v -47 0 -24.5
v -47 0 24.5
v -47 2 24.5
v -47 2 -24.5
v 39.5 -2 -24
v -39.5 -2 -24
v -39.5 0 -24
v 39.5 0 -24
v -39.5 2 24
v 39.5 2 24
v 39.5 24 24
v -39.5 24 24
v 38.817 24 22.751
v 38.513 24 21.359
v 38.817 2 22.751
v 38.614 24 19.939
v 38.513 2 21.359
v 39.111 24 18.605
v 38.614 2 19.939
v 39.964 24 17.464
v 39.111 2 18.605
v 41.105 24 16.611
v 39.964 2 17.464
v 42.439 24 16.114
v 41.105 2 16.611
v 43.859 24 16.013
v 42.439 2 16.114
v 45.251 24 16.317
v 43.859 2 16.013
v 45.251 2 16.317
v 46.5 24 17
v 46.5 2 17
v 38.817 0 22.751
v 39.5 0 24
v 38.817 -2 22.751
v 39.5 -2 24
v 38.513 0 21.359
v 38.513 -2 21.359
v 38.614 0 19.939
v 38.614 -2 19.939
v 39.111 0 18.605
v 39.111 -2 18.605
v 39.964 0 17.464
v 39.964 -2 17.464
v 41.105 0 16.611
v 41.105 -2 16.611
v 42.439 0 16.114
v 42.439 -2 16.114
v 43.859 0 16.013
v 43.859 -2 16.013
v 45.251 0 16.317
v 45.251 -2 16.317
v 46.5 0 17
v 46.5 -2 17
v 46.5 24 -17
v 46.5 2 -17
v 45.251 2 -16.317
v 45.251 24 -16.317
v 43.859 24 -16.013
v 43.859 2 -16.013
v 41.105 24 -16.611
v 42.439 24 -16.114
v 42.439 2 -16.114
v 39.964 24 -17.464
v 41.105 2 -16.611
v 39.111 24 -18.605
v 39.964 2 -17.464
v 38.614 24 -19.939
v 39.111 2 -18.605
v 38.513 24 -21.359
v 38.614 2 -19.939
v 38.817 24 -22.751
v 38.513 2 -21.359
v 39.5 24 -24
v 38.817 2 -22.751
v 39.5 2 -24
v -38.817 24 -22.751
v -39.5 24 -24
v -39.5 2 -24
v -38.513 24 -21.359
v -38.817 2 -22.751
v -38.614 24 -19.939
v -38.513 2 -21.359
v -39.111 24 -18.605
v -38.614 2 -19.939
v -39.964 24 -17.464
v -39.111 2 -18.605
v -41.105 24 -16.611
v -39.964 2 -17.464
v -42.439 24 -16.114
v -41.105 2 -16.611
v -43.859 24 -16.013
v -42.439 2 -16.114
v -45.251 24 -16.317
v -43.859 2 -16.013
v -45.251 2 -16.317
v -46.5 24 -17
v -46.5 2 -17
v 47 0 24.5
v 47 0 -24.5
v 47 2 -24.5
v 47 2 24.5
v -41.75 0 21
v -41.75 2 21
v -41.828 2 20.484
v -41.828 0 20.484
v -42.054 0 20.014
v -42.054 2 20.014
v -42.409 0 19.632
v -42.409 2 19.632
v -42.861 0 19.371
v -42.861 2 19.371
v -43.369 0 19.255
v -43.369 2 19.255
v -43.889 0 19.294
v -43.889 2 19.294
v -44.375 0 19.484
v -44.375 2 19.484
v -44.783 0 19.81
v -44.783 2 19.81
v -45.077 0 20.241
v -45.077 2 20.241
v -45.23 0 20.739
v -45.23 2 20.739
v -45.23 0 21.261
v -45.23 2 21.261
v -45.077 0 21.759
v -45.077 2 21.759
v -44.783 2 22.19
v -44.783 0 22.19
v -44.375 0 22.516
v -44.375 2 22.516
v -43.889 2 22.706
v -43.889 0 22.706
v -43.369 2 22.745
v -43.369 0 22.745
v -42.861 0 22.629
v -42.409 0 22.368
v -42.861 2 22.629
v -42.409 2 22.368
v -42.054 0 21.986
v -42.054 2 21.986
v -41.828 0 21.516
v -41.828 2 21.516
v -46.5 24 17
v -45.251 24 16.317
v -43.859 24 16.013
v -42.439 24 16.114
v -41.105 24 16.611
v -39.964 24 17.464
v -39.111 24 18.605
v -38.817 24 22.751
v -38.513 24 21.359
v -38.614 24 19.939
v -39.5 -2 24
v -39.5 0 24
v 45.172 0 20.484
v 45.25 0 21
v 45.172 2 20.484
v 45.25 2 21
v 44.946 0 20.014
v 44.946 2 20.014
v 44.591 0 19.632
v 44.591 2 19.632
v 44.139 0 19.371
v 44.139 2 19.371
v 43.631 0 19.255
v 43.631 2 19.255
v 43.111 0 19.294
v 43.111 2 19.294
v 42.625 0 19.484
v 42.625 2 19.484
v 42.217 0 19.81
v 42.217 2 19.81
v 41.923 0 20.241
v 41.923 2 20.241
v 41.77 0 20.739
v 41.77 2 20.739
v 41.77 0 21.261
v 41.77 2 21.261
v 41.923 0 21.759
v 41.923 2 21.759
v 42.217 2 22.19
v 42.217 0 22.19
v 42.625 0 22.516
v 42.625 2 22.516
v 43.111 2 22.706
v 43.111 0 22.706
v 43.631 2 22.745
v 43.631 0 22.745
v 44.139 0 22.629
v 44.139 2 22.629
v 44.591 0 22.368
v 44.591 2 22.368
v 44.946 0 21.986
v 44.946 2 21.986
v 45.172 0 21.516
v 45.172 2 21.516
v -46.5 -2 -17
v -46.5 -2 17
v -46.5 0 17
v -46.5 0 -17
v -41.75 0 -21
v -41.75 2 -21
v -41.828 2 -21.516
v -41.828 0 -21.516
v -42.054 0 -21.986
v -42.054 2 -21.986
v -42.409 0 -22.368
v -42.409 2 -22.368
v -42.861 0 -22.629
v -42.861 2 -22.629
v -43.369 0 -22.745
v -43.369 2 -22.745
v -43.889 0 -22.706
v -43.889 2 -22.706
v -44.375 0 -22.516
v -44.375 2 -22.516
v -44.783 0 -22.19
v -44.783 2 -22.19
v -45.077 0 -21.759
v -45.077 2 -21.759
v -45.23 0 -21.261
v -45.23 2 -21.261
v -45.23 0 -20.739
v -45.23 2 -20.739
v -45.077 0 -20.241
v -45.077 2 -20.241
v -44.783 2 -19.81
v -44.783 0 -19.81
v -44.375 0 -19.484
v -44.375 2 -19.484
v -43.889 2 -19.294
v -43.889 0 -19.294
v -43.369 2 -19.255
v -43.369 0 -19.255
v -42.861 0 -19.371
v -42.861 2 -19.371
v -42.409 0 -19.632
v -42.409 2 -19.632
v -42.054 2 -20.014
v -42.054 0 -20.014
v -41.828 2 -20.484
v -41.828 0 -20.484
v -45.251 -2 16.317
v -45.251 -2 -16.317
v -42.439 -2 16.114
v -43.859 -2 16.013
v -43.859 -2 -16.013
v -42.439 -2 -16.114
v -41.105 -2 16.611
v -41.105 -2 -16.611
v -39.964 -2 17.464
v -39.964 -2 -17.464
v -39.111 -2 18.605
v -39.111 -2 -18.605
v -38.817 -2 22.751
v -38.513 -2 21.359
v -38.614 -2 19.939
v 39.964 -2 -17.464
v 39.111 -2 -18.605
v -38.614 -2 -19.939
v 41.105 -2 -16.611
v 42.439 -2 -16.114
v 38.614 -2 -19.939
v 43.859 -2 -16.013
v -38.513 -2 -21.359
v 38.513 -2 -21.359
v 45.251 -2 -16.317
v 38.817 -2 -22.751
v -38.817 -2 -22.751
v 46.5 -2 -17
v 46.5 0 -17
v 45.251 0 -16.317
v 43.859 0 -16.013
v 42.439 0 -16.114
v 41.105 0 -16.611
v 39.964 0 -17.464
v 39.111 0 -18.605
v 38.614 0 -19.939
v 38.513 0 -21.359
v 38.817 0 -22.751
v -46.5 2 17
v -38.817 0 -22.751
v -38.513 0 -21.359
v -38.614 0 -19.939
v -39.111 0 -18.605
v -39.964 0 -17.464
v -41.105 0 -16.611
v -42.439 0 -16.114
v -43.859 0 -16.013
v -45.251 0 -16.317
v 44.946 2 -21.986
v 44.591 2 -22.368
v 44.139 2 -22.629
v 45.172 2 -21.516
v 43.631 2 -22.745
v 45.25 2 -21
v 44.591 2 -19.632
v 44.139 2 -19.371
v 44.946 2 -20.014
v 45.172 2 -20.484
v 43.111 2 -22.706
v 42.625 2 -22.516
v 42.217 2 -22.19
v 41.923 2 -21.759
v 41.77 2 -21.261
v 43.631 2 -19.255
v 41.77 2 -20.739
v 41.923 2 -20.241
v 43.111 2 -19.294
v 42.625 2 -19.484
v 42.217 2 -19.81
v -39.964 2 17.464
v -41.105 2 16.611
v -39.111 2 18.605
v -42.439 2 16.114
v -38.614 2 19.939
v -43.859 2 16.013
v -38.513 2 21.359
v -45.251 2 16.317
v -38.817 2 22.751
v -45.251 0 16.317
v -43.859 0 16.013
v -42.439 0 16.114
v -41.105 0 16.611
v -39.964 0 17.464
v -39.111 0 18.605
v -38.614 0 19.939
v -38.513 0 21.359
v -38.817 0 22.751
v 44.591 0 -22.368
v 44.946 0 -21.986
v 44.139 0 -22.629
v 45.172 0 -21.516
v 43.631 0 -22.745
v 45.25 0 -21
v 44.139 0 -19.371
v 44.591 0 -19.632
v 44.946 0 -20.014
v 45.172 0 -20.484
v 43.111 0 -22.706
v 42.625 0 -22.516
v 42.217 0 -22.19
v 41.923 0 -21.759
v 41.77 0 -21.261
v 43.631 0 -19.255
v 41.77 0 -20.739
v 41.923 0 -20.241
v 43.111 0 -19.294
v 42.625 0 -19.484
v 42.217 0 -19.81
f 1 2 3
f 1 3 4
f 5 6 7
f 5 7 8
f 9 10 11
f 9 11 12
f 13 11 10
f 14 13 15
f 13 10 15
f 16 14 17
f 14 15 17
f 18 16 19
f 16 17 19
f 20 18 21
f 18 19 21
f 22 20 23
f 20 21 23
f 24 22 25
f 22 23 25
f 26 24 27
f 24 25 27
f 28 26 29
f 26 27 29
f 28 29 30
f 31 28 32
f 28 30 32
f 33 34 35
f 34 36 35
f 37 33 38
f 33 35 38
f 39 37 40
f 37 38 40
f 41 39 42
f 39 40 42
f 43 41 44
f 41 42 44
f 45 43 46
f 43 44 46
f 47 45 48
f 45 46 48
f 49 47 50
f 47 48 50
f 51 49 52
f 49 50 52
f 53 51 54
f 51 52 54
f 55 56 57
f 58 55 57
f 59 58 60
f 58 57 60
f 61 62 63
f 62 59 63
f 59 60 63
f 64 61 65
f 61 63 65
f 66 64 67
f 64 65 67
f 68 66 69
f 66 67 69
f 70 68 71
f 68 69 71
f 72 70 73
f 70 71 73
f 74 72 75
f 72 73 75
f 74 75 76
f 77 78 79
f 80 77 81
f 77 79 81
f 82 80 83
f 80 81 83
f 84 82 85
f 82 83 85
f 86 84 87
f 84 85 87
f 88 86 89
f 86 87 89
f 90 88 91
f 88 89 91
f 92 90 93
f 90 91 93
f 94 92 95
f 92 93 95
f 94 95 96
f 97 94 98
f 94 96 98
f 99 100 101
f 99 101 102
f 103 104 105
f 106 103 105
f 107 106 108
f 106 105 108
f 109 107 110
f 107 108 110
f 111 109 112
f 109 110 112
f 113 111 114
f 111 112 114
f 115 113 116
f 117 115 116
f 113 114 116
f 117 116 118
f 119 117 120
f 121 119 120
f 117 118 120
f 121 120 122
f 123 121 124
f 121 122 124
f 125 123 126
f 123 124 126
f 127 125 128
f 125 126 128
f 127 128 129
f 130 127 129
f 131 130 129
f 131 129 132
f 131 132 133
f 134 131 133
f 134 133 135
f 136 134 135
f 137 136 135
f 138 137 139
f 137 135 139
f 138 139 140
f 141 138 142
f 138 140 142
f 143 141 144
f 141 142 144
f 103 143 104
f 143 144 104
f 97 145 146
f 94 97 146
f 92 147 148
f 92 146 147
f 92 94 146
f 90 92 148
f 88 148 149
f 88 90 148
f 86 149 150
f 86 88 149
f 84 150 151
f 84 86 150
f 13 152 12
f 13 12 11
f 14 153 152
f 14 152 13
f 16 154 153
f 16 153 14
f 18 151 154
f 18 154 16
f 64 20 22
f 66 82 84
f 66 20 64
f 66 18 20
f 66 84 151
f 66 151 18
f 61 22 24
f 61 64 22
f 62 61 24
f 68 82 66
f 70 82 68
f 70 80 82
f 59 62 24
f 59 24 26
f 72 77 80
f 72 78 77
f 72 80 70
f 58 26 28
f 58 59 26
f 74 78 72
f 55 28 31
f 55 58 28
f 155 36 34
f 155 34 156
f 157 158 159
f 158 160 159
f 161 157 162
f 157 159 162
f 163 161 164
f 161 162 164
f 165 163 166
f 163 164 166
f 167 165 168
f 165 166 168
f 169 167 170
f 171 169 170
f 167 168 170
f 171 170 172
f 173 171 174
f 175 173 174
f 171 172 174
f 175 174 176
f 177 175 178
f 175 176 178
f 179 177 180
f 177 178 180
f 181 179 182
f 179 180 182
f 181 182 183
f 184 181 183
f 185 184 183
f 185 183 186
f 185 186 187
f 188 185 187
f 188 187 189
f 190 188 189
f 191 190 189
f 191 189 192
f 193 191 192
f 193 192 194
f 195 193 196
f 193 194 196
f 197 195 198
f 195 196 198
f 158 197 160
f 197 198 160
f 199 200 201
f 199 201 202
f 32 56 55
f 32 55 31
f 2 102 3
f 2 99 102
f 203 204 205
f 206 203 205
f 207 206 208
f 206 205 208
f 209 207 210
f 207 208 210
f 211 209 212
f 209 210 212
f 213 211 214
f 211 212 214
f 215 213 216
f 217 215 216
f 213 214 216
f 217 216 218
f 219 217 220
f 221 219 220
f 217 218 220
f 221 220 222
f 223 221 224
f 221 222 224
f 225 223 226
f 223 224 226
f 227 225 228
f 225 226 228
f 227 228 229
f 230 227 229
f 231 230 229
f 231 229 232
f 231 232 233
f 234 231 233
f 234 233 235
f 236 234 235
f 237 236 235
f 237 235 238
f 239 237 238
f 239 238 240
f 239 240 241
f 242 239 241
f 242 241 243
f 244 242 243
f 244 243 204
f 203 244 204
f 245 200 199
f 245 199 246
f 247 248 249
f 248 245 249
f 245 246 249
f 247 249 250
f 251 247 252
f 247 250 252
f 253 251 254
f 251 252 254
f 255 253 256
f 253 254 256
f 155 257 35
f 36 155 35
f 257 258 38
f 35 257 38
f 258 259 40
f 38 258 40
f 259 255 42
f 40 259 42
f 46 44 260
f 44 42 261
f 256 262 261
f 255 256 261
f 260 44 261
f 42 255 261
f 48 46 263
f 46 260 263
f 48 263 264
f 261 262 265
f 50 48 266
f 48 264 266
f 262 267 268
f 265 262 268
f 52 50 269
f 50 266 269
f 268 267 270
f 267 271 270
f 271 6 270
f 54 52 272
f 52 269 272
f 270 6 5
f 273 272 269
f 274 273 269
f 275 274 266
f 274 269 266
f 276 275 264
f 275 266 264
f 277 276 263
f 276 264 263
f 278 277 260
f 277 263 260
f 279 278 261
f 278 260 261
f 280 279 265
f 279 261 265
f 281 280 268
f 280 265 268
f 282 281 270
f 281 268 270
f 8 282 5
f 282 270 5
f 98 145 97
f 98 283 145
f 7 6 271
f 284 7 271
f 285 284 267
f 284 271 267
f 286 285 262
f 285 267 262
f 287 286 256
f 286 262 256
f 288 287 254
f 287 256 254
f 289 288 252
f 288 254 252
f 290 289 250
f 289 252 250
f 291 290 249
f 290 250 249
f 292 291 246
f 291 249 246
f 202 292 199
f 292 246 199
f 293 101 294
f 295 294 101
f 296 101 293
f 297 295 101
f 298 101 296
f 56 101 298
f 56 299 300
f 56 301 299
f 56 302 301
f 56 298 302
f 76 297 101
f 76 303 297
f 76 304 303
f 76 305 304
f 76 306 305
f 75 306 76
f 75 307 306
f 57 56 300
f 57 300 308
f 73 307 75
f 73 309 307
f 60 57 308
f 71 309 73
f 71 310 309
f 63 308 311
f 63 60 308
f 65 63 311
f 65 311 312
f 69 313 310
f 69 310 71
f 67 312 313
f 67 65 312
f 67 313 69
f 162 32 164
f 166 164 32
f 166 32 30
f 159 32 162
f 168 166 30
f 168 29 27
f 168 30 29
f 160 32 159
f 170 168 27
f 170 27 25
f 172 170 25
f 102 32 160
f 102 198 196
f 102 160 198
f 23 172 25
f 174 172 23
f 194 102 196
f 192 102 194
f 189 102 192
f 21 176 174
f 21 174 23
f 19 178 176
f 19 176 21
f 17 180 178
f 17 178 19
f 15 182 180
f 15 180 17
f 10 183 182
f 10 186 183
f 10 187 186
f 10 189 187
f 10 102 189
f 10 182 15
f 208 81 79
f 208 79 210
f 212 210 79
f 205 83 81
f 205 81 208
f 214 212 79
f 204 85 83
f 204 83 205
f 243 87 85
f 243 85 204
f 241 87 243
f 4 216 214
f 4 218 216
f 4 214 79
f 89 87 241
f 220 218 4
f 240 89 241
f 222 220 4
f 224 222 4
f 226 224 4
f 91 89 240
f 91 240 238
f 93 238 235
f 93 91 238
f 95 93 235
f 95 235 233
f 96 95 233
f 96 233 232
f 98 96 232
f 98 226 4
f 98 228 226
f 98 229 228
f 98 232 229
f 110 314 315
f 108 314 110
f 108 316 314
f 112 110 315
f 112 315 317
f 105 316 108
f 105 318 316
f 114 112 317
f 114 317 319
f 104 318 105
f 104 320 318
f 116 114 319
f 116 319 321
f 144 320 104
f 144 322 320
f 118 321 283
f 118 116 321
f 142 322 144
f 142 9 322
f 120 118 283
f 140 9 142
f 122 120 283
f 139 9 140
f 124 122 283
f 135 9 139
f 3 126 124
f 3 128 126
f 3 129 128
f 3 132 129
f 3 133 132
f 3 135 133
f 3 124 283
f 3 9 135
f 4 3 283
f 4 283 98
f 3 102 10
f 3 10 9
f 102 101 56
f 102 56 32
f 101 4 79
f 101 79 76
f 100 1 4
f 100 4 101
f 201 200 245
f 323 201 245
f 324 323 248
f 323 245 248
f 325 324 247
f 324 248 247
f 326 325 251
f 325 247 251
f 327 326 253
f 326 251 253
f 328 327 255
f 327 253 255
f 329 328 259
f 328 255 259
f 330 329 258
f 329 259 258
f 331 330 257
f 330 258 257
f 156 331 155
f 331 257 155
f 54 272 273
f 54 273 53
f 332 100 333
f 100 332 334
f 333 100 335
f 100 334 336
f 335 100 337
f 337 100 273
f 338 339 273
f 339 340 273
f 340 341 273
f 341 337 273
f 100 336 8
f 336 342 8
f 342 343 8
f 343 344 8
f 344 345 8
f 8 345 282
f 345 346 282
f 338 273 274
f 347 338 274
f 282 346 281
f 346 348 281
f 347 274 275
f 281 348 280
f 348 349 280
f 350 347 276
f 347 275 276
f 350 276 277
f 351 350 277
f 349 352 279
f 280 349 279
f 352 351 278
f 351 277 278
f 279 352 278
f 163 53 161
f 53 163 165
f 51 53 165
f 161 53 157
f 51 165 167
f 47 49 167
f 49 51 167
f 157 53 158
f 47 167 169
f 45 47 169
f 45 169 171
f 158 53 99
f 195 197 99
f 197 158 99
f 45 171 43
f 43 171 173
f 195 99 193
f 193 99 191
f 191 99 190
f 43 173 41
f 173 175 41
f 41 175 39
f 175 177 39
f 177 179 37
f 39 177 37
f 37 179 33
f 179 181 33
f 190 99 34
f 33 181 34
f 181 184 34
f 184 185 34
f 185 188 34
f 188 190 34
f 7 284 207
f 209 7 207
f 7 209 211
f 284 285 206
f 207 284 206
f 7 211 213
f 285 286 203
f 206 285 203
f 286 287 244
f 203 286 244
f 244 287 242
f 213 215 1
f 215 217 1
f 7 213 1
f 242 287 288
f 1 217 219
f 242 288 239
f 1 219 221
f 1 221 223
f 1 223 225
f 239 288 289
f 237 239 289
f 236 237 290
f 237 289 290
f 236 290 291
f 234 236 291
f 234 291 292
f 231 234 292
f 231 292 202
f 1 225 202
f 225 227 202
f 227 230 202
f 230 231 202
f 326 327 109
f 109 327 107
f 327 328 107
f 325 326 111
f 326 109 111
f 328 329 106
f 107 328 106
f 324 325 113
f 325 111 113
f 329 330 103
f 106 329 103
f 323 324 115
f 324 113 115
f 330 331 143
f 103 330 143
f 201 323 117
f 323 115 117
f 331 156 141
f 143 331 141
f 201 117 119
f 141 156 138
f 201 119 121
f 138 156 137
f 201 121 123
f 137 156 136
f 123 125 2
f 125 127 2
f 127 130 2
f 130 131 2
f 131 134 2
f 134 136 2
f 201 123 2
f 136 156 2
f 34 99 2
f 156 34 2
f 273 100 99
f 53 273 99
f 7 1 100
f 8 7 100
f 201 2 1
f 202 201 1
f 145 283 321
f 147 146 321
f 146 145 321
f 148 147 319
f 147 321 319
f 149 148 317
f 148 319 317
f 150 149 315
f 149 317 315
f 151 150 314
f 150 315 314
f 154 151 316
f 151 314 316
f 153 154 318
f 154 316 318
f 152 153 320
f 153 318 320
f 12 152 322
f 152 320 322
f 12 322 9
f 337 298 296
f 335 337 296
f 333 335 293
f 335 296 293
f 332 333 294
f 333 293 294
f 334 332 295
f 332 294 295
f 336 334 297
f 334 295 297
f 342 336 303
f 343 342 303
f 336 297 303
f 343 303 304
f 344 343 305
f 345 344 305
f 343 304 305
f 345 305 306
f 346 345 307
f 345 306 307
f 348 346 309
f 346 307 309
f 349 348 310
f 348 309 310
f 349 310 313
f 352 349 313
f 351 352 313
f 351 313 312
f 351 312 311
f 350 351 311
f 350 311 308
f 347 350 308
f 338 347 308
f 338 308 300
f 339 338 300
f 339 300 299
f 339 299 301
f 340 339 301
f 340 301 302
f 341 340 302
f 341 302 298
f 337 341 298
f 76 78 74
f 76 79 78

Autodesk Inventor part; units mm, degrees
ref_plane "YZ Plane" through (0, 0, 0) normal (1, 0, 0) x (0, 1, 0)
ref_plane "XZ Plane" through (0, 0, 0) normal (0, 1, 0) x (-1, 0, 0)
ref_plane "XY Plane" through (0, 0, 0) normal (0, 0, 1) x (1, 0, 0)
sketch "Skizze1" plane through (0, 0, 0) normal (0, 1, 0) x (-1, 0, 0)
  line L0 (47, -24.5) -> (-47, -24.5)
  line L1 (-47, -24.5) -> (-47, 24.5)
  line L2 (-47, 24.5) -> (47, 24.5)
  line L3 (47, 24.5) -> (47, -24.5)
  point P0 (0, 0)
  point P1 (0, -24.5)
  point P2 (47, 0)
  dimension "d0" = 49
  dimension "d1" = 94
extrude "Extrusion1" add sketch "Skizze1" along normal blind 2
sketch "Skizze2" plane through (0, 2, 0) normal (0, 1, 0) x (1, 0, 0)
  circle A0 centre (-43.5, 21) radius 1.75
  circle A1 centre (-43.5, -21) radius 1.75
  circle A2 centre (43.5, -21) radius 1.75
  circle A3 centre (43.5, 21) radius 1.75
  point P0 (0, 0)
  dimension "d4" = 3.5
  dimension "d5" = 3.5
  dimension "d6" = 3.5
  dimension "d7" = 3.5
  dimension "d8" = 87
  dimension "d9" = 43.5
  dimension "d10" = 42
  dimension "d11" = 21
extrude "Extrusion2" cut sketch "Skizze2" against normal through all
sketch "Skizze4" plane through (0, 2, 0) normal (0, 1, 0) x (1, 0, 0)
  line L0 (-39.5, 24) -> (39.5, 24)
  line L1 (46.5, 17) -> (46.5, -17)
  line L2 (39.5, -24) -> (-39.5, -24)
  line L3 (-46.5, -17) -> (-46.5, 17)
  line L4 (47, -24.5) -> (47, 24.5) projected
  line L5 (47, 24.5) -> (-47, 24.5) projected
  line L6 (-47, -24.5) -> (47, -24.5) projected
  line L7 (-47, 24.5) -> (-47, -24.5) projected
  circle A0 centre (-43.5, 21) radius 1.75 projected
  arc A1 (-46.5, 17) -> (-39.5, 24) centre (-43.5, 21) ccw
  circle A2 centre (-43.5, -21) radius 1.75 projected
  arc A3 (-39.5, -24) -> (-46.5, -17) centre (-43.5, -21) ccw
  circle A4 centre (43.5, -21) radius 1.75 projected
  arc A5 (46.5, -17) -> (39.5, -24) centre (43.5, -21) ccw
  arc A6 (39.5, 24) -> (46.5, 17) centre (43.5, 21) ccw
  circle A7 centre (43.5, 21) radius 1.75 projected
  point P0 (0, 0)
  dimension "d14" = 0.5
  dimension "d15" = 0.5
  dimension "d16" = 0.5
  dimension "d17" = 0.5
  dimension "d19" = 5
  dimension "d20" = 5
  dimension "d21" = 5
  dimension "d22" = 5
extrude "Extrusion3" add sketch "Skizze4" along normal blind 22 and the other way blind 4 contours L0 A6 L1 A5 L2 A3 L3 A1
equation "\"d9\" = 0.5 * d8"
equation "\"d11\" = 0.5 * d10"
equation "\"d14\" = d15"
equation "\"d16\" = d15"
equation "\"d17\" = d15"
equation "\"d19\" = d20"
equation "\"d21\" = d20"
equation "\"d22\" = d20"
properties part number "netzteil_3.3V"
